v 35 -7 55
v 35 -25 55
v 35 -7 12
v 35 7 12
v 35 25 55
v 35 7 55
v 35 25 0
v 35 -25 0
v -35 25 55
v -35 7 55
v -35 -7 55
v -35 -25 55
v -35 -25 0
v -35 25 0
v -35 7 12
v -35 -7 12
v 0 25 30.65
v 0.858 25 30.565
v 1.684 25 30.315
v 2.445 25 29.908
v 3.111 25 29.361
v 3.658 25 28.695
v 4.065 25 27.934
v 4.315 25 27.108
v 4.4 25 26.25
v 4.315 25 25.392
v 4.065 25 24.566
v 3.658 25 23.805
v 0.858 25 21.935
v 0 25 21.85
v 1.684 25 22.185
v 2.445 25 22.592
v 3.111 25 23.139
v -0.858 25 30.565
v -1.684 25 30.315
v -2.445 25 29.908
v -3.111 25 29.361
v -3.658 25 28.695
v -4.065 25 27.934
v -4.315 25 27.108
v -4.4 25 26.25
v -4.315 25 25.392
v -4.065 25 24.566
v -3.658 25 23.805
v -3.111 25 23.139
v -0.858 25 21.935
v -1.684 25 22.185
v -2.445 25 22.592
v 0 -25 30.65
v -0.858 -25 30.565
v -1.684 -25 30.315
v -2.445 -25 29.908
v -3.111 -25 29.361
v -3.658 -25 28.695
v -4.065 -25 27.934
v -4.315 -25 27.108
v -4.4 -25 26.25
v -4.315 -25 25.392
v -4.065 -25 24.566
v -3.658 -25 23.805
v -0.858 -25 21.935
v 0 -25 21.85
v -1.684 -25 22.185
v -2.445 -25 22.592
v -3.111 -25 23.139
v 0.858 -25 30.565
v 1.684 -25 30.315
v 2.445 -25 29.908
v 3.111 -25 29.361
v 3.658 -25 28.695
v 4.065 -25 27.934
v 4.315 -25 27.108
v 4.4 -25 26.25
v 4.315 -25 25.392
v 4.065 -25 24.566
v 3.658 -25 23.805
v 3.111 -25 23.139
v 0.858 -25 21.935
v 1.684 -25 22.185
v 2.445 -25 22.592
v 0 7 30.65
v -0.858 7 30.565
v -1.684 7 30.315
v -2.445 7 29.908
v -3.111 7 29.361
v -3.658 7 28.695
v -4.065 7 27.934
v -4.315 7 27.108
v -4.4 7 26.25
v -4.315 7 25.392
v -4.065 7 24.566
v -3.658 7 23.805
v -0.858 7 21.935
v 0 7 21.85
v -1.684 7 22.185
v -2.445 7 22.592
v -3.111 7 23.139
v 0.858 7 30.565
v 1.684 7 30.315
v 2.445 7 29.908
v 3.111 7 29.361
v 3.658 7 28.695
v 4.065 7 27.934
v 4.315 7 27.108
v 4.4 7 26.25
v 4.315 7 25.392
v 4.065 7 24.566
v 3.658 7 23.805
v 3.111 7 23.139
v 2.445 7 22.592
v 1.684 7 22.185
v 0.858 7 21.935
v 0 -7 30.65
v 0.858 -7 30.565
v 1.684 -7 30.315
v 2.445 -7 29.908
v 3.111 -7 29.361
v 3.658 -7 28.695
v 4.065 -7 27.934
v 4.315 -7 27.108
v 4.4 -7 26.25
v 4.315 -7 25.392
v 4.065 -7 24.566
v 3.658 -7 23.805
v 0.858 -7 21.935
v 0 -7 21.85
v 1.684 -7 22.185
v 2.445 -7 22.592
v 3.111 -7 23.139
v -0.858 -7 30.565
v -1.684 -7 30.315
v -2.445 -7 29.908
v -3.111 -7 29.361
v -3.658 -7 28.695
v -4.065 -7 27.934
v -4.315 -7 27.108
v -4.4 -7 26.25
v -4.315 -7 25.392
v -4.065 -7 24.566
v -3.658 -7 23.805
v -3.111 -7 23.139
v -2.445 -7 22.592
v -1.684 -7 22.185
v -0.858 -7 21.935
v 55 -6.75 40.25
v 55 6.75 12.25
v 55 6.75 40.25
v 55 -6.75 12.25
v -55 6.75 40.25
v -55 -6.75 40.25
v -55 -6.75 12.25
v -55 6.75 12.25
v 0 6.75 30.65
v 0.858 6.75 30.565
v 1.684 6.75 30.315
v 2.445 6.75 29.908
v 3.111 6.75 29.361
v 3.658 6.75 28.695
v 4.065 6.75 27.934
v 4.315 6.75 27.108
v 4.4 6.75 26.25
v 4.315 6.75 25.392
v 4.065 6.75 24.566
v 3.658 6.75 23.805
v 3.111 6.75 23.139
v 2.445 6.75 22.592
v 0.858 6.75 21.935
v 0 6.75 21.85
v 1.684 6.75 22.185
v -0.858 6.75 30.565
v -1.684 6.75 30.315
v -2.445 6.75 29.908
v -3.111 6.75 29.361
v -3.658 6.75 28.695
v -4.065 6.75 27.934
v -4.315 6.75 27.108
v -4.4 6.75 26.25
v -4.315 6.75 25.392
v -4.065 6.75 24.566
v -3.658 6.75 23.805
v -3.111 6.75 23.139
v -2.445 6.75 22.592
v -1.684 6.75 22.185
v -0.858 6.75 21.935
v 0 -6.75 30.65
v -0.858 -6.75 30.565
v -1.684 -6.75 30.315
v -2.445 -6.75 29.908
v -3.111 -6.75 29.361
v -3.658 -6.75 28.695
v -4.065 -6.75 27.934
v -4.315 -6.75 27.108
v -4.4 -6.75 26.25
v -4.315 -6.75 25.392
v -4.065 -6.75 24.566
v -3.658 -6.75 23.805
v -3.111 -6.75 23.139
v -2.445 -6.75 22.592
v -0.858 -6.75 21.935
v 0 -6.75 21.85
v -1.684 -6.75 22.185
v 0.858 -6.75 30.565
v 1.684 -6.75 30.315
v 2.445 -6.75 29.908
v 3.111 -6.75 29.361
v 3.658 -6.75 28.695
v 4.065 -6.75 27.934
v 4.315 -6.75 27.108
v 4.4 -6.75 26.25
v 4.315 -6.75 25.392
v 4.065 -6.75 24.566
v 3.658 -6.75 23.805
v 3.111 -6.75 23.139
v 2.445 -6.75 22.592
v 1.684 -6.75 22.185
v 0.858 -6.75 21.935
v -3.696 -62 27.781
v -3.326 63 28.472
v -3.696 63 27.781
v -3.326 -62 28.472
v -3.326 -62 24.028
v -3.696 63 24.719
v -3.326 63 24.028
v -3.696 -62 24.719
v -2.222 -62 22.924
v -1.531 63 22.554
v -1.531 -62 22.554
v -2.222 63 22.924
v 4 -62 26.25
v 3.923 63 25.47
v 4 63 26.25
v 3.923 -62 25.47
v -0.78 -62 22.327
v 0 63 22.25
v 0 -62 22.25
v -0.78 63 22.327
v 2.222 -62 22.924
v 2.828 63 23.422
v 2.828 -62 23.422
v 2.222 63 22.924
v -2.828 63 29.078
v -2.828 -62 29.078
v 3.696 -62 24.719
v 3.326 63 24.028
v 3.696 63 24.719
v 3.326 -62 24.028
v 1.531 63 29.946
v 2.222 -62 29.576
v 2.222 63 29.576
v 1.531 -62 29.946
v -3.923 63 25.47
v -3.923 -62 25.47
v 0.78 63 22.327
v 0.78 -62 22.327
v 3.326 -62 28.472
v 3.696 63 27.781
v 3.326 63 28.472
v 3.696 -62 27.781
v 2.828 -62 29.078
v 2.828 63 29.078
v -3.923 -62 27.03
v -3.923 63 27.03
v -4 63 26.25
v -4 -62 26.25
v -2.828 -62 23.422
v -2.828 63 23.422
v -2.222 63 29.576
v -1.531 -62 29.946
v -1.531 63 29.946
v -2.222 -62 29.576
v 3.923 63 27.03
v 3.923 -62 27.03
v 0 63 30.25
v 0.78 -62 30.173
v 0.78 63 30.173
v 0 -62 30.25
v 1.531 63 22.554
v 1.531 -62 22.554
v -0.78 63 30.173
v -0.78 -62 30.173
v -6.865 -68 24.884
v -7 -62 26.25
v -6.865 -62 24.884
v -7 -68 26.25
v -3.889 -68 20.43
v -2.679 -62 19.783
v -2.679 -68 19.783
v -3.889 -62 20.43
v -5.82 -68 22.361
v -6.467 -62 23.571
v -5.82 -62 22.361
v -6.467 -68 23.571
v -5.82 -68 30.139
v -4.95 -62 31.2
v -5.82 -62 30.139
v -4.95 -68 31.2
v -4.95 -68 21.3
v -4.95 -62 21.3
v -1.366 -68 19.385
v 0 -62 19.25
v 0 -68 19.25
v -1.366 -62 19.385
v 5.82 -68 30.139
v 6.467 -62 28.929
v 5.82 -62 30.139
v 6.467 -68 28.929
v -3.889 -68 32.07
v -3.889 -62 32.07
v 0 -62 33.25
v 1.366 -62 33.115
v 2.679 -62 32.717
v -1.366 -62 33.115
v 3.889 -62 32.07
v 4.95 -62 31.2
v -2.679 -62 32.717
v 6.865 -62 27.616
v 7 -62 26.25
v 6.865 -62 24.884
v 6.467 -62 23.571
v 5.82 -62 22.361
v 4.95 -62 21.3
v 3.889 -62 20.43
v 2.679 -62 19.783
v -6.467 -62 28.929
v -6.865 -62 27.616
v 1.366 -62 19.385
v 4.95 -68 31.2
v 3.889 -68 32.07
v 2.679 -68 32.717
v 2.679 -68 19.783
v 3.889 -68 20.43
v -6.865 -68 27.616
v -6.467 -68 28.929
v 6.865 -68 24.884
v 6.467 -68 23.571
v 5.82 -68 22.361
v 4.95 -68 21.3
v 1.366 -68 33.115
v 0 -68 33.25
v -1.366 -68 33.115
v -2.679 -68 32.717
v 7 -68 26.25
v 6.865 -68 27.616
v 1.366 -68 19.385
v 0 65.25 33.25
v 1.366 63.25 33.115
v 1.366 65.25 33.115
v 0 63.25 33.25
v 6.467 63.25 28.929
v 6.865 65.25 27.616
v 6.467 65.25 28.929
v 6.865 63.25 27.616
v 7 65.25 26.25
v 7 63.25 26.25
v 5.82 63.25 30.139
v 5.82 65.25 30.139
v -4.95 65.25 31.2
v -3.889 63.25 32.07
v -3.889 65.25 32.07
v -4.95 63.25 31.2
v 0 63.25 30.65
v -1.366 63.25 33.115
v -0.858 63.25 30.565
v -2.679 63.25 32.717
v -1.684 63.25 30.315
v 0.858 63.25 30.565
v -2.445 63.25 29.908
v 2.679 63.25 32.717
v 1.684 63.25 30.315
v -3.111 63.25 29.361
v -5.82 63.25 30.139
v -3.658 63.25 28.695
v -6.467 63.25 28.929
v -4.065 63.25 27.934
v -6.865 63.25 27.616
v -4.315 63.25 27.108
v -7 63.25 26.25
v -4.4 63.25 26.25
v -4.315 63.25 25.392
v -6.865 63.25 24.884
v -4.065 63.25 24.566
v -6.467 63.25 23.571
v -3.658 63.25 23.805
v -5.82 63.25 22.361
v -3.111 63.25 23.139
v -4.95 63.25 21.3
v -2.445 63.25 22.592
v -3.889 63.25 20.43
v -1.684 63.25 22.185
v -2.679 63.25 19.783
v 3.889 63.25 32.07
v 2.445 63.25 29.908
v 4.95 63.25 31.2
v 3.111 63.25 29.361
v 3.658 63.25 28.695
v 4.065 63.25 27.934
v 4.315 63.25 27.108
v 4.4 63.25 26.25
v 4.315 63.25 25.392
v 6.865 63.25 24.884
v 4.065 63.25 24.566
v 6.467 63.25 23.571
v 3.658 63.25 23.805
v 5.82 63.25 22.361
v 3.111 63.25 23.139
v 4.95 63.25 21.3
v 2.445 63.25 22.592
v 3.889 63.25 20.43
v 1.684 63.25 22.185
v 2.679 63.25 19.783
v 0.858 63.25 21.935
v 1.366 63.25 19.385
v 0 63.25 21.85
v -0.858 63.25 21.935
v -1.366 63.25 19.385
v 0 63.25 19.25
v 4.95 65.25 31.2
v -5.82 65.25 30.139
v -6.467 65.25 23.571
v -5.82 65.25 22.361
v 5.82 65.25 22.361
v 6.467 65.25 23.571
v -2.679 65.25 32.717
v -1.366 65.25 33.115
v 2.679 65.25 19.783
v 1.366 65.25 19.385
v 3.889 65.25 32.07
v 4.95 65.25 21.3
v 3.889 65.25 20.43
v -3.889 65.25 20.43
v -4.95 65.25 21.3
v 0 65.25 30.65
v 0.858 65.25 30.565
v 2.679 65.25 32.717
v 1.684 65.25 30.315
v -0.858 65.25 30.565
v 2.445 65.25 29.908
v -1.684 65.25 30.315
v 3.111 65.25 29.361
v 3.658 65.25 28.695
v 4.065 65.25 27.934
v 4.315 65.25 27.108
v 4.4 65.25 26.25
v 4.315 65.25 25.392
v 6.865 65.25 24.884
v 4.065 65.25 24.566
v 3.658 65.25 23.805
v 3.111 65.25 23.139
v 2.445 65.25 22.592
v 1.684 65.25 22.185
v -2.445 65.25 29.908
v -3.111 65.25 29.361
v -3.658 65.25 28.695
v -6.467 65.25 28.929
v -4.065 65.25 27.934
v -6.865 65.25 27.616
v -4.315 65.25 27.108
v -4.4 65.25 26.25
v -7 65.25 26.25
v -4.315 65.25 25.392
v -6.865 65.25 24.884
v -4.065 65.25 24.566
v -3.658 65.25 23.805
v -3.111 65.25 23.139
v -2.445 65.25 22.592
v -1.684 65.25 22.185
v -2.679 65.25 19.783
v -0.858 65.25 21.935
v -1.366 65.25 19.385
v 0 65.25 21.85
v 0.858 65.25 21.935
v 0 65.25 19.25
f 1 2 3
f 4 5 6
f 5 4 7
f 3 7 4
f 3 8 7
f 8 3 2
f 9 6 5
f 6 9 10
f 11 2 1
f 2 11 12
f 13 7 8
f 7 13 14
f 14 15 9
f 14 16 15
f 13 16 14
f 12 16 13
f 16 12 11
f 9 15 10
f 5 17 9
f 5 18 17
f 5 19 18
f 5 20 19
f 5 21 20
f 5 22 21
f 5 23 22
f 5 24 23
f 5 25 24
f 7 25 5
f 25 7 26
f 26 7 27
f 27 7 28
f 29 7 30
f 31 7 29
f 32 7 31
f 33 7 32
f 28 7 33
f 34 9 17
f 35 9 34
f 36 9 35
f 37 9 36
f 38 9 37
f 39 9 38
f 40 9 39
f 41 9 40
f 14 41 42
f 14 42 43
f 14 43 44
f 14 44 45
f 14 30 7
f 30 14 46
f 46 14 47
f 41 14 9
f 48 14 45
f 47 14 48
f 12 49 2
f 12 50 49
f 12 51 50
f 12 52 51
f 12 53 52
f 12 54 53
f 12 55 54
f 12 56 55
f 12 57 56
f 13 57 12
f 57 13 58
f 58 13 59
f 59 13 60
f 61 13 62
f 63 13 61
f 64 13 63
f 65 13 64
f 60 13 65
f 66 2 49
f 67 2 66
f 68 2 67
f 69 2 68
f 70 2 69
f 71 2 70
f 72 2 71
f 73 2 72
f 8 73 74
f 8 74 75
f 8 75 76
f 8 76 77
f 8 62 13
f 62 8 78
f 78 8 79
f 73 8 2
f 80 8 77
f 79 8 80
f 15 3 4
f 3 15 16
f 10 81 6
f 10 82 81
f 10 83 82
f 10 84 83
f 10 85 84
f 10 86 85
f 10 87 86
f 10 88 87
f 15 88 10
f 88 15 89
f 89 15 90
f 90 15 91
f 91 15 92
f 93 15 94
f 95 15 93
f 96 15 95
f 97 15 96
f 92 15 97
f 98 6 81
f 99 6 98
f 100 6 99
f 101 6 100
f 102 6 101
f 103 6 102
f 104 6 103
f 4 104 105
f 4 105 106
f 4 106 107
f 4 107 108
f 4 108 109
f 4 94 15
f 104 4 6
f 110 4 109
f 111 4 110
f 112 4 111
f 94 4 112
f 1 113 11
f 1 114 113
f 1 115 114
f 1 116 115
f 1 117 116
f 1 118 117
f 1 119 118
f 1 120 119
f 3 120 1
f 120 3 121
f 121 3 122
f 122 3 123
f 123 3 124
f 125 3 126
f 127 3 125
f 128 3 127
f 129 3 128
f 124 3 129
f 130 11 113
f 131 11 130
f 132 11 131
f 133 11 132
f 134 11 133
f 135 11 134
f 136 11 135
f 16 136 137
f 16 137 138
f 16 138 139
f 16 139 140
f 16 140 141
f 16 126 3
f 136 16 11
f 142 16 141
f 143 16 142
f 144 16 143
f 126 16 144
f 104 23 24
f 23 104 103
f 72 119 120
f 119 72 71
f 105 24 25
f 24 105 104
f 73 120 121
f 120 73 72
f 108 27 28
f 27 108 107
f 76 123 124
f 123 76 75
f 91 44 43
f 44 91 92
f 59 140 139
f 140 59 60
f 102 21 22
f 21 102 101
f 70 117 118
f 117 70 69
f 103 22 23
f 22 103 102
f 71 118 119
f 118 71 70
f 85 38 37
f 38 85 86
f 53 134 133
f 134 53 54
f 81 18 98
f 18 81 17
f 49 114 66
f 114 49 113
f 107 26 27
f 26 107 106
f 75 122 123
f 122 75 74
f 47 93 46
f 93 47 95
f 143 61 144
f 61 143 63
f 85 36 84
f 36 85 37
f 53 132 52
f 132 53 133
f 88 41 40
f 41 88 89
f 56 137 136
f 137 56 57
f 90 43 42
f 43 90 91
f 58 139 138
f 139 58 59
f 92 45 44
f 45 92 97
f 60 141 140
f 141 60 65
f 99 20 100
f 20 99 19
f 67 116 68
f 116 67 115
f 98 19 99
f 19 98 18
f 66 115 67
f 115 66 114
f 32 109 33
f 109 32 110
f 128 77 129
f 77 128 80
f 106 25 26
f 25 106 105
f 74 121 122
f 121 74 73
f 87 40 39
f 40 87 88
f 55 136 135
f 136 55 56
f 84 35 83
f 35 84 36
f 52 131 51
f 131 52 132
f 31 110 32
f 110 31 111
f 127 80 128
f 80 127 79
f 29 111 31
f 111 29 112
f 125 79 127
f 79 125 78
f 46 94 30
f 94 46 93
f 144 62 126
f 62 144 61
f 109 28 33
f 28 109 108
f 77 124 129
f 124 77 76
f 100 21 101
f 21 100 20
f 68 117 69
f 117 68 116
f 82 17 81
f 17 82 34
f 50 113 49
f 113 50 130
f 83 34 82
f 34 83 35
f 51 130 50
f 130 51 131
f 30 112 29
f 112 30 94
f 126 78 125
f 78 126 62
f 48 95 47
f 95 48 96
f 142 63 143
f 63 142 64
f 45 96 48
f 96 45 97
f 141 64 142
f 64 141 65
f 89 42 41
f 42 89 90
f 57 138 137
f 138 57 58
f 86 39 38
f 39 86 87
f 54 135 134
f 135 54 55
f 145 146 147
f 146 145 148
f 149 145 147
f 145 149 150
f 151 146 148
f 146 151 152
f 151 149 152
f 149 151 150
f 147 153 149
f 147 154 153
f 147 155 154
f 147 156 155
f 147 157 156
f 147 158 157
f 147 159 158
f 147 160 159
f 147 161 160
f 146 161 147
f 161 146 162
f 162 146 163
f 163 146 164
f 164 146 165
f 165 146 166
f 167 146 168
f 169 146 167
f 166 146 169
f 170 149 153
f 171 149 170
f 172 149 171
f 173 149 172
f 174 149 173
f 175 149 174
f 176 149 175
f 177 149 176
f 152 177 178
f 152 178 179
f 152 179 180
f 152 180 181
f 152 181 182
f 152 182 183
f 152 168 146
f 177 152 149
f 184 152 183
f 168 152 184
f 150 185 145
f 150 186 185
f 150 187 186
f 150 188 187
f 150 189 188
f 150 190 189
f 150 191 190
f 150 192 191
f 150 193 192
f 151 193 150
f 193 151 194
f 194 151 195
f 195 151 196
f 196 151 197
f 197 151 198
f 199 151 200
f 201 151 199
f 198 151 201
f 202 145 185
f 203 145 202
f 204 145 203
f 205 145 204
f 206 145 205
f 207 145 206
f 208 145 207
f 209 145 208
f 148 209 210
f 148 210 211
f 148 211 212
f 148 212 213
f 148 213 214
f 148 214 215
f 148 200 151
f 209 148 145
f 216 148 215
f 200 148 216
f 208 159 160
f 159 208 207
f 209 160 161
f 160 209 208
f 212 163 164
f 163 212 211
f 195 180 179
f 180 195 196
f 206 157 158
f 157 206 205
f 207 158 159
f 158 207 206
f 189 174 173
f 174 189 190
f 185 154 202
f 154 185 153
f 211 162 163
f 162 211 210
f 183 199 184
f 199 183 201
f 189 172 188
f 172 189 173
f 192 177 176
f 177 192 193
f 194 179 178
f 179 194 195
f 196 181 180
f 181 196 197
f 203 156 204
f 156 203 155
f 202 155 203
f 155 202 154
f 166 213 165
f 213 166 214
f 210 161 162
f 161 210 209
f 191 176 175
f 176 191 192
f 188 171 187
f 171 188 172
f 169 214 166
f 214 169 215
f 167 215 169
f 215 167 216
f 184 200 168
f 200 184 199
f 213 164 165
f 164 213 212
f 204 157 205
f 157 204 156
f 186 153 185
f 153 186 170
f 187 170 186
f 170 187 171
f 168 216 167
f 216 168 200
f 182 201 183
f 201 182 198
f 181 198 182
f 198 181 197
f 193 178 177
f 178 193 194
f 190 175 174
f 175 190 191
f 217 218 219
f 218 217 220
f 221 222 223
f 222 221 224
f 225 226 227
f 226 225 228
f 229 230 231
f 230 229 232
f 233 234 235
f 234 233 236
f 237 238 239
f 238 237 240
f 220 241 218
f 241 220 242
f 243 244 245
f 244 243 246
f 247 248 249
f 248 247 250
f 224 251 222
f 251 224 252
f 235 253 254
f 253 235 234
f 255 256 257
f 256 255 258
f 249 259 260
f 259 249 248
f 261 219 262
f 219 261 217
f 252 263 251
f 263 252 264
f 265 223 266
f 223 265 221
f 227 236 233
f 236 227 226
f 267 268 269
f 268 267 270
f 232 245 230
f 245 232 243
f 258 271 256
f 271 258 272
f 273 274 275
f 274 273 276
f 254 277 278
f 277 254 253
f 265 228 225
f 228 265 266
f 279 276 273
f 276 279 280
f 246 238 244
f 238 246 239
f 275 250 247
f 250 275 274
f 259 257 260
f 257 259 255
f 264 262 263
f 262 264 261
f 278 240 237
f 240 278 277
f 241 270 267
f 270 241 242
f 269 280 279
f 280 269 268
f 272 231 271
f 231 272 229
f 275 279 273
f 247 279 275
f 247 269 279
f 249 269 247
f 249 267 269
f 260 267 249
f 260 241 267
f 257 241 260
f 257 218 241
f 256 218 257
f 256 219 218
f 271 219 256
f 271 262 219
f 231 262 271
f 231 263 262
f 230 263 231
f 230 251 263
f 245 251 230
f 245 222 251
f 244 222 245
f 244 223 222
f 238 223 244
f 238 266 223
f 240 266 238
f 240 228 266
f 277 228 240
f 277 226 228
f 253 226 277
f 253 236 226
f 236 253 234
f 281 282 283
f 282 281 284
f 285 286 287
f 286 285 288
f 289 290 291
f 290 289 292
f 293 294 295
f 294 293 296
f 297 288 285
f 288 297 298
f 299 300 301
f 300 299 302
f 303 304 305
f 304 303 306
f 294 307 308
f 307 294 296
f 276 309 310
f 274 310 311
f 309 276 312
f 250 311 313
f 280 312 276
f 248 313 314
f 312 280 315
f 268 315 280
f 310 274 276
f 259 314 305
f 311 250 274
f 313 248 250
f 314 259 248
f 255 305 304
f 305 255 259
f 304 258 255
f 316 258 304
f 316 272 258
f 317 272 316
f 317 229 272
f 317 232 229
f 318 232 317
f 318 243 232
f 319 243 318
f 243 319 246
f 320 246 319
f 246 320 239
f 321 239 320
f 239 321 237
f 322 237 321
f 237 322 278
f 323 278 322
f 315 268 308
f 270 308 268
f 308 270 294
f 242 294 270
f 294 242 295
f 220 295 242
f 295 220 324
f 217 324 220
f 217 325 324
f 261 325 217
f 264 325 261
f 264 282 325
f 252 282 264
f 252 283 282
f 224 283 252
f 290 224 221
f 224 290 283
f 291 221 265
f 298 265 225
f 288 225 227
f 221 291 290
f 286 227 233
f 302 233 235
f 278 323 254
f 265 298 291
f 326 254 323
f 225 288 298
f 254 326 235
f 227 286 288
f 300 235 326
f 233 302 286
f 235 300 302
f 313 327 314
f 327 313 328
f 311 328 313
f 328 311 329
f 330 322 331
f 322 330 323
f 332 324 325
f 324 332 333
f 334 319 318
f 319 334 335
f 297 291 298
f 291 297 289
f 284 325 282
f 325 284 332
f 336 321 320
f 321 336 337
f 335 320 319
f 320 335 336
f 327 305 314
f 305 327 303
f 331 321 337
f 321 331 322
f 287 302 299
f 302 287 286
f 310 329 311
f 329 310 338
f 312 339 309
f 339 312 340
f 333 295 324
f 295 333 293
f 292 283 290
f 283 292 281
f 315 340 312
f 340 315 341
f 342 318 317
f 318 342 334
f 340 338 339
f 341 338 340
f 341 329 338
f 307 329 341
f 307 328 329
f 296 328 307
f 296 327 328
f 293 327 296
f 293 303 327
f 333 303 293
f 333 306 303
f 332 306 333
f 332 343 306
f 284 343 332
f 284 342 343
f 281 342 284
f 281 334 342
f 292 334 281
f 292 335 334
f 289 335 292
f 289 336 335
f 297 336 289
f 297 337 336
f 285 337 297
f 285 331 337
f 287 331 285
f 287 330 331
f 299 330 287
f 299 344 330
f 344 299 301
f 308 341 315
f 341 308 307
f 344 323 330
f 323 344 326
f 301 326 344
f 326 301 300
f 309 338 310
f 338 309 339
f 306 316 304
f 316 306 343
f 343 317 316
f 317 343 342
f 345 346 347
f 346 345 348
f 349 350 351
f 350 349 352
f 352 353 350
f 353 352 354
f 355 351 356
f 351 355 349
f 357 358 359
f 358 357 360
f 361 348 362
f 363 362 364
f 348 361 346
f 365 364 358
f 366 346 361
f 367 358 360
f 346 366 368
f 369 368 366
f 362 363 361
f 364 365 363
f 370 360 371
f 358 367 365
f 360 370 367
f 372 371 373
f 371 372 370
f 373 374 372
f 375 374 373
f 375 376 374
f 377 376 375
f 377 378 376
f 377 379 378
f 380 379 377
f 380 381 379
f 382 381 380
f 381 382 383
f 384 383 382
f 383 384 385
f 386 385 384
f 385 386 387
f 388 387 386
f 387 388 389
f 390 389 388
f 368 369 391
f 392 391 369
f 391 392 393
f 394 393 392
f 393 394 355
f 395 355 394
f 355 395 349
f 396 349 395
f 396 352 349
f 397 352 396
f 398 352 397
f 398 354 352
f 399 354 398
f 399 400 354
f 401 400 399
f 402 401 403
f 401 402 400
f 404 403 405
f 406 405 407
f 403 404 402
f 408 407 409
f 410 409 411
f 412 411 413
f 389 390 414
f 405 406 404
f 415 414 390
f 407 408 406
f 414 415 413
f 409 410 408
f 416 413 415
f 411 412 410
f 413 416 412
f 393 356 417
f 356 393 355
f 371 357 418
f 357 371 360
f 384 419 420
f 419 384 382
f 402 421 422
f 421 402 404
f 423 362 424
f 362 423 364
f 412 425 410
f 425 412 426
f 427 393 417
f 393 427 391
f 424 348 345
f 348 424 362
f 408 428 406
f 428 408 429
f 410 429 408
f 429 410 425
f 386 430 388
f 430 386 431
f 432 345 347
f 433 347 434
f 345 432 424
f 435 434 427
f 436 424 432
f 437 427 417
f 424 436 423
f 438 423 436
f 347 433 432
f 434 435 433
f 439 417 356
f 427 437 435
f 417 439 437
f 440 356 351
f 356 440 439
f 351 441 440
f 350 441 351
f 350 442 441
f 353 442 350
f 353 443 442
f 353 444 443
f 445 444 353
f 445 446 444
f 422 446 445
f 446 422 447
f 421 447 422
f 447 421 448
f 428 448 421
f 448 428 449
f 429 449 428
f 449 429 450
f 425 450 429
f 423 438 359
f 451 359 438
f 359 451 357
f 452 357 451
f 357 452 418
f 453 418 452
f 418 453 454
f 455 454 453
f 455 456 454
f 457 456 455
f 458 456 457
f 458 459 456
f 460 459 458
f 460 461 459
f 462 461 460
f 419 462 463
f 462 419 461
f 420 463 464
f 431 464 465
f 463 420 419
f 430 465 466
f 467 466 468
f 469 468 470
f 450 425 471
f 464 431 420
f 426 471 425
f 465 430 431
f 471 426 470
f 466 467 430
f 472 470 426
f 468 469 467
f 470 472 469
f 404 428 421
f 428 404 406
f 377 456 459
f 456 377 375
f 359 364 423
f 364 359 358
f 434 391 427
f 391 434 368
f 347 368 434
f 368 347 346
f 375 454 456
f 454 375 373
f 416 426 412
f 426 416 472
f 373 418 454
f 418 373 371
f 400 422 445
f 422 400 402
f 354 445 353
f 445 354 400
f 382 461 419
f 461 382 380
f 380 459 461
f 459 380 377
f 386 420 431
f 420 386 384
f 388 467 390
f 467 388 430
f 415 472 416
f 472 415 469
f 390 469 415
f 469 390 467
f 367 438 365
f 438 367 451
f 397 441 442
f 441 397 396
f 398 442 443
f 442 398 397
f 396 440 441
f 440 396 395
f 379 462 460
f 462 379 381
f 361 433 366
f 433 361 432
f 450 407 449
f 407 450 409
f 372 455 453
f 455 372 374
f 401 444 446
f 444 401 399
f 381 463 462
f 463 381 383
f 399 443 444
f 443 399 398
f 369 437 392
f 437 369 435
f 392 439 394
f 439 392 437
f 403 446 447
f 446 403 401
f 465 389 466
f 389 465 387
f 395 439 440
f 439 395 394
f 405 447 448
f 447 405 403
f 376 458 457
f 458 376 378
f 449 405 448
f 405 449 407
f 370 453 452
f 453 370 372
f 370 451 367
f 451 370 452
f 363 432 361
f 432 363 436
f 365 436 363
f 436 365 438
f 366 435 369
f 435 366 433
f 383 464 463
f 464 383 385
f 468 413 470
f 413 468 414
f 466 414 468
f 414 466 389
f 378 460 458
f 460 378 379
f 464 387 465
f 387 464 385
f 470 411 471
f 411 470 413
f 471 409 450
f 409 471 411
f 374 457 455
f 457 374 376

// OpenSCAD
$fn = 32;

// ------------------------------------------------------------------------
// Clevis joint: 70 mm clevis, pin d8
// Every part is its own module, assembly() places them once.
// ------------------------------------------------------------------------

// --- part 1 ---
module clevis() {
  difference() {
    translate([-35, -25, 0]) cube([70, 50, 55]);
    translate([-36, -7, 12]) cube([72, 14, 44]);
    translate([0, 0, 26.25]) rotate([90, 0, 0]) cylinder(h = 52, d = 8.8, center = true);
  }
}

// --- part 2 ---
module eye() {
  difference() {
    translate([-55, -6.75, 0]) cube([110, 13.5, 28]);
    translate([0, 0, 14]) rotate([90, 0, 0]) cylinder(h = 15.5, d = 8.8, center = true);
  }
}

// --- part 3 ---
module pin() {
  rotate([0, 90, 0]) cylinder(h = 126, d = 8, center = true);
  translate([-68, 0, 0]) rotate([0, 90, 0]) cylinder(h = 6, d = 14);
}

// --- part 4 ---
module retainer() {
  difference() {
      translate([0, 0, 0]) cylinder(h = 2, d = 14);
      translate([0, 0, -1]) cylinder(h = 4, d = 8.8);
    }
}

// --- assembly ---
module assembly() {
  translate([0, 0, 0]) rotate([0, 0, 0]) clevis();
  translate([0, 0, 12.25]) rotate([0, 0, 0]) eye();
  translate([0, 0, 26.25]) rotate([0, 0, 90]) pin();
  translate([0, 65.25, 26.25]) rotate([90, 0, 0]) retainer();
}

assembly();
